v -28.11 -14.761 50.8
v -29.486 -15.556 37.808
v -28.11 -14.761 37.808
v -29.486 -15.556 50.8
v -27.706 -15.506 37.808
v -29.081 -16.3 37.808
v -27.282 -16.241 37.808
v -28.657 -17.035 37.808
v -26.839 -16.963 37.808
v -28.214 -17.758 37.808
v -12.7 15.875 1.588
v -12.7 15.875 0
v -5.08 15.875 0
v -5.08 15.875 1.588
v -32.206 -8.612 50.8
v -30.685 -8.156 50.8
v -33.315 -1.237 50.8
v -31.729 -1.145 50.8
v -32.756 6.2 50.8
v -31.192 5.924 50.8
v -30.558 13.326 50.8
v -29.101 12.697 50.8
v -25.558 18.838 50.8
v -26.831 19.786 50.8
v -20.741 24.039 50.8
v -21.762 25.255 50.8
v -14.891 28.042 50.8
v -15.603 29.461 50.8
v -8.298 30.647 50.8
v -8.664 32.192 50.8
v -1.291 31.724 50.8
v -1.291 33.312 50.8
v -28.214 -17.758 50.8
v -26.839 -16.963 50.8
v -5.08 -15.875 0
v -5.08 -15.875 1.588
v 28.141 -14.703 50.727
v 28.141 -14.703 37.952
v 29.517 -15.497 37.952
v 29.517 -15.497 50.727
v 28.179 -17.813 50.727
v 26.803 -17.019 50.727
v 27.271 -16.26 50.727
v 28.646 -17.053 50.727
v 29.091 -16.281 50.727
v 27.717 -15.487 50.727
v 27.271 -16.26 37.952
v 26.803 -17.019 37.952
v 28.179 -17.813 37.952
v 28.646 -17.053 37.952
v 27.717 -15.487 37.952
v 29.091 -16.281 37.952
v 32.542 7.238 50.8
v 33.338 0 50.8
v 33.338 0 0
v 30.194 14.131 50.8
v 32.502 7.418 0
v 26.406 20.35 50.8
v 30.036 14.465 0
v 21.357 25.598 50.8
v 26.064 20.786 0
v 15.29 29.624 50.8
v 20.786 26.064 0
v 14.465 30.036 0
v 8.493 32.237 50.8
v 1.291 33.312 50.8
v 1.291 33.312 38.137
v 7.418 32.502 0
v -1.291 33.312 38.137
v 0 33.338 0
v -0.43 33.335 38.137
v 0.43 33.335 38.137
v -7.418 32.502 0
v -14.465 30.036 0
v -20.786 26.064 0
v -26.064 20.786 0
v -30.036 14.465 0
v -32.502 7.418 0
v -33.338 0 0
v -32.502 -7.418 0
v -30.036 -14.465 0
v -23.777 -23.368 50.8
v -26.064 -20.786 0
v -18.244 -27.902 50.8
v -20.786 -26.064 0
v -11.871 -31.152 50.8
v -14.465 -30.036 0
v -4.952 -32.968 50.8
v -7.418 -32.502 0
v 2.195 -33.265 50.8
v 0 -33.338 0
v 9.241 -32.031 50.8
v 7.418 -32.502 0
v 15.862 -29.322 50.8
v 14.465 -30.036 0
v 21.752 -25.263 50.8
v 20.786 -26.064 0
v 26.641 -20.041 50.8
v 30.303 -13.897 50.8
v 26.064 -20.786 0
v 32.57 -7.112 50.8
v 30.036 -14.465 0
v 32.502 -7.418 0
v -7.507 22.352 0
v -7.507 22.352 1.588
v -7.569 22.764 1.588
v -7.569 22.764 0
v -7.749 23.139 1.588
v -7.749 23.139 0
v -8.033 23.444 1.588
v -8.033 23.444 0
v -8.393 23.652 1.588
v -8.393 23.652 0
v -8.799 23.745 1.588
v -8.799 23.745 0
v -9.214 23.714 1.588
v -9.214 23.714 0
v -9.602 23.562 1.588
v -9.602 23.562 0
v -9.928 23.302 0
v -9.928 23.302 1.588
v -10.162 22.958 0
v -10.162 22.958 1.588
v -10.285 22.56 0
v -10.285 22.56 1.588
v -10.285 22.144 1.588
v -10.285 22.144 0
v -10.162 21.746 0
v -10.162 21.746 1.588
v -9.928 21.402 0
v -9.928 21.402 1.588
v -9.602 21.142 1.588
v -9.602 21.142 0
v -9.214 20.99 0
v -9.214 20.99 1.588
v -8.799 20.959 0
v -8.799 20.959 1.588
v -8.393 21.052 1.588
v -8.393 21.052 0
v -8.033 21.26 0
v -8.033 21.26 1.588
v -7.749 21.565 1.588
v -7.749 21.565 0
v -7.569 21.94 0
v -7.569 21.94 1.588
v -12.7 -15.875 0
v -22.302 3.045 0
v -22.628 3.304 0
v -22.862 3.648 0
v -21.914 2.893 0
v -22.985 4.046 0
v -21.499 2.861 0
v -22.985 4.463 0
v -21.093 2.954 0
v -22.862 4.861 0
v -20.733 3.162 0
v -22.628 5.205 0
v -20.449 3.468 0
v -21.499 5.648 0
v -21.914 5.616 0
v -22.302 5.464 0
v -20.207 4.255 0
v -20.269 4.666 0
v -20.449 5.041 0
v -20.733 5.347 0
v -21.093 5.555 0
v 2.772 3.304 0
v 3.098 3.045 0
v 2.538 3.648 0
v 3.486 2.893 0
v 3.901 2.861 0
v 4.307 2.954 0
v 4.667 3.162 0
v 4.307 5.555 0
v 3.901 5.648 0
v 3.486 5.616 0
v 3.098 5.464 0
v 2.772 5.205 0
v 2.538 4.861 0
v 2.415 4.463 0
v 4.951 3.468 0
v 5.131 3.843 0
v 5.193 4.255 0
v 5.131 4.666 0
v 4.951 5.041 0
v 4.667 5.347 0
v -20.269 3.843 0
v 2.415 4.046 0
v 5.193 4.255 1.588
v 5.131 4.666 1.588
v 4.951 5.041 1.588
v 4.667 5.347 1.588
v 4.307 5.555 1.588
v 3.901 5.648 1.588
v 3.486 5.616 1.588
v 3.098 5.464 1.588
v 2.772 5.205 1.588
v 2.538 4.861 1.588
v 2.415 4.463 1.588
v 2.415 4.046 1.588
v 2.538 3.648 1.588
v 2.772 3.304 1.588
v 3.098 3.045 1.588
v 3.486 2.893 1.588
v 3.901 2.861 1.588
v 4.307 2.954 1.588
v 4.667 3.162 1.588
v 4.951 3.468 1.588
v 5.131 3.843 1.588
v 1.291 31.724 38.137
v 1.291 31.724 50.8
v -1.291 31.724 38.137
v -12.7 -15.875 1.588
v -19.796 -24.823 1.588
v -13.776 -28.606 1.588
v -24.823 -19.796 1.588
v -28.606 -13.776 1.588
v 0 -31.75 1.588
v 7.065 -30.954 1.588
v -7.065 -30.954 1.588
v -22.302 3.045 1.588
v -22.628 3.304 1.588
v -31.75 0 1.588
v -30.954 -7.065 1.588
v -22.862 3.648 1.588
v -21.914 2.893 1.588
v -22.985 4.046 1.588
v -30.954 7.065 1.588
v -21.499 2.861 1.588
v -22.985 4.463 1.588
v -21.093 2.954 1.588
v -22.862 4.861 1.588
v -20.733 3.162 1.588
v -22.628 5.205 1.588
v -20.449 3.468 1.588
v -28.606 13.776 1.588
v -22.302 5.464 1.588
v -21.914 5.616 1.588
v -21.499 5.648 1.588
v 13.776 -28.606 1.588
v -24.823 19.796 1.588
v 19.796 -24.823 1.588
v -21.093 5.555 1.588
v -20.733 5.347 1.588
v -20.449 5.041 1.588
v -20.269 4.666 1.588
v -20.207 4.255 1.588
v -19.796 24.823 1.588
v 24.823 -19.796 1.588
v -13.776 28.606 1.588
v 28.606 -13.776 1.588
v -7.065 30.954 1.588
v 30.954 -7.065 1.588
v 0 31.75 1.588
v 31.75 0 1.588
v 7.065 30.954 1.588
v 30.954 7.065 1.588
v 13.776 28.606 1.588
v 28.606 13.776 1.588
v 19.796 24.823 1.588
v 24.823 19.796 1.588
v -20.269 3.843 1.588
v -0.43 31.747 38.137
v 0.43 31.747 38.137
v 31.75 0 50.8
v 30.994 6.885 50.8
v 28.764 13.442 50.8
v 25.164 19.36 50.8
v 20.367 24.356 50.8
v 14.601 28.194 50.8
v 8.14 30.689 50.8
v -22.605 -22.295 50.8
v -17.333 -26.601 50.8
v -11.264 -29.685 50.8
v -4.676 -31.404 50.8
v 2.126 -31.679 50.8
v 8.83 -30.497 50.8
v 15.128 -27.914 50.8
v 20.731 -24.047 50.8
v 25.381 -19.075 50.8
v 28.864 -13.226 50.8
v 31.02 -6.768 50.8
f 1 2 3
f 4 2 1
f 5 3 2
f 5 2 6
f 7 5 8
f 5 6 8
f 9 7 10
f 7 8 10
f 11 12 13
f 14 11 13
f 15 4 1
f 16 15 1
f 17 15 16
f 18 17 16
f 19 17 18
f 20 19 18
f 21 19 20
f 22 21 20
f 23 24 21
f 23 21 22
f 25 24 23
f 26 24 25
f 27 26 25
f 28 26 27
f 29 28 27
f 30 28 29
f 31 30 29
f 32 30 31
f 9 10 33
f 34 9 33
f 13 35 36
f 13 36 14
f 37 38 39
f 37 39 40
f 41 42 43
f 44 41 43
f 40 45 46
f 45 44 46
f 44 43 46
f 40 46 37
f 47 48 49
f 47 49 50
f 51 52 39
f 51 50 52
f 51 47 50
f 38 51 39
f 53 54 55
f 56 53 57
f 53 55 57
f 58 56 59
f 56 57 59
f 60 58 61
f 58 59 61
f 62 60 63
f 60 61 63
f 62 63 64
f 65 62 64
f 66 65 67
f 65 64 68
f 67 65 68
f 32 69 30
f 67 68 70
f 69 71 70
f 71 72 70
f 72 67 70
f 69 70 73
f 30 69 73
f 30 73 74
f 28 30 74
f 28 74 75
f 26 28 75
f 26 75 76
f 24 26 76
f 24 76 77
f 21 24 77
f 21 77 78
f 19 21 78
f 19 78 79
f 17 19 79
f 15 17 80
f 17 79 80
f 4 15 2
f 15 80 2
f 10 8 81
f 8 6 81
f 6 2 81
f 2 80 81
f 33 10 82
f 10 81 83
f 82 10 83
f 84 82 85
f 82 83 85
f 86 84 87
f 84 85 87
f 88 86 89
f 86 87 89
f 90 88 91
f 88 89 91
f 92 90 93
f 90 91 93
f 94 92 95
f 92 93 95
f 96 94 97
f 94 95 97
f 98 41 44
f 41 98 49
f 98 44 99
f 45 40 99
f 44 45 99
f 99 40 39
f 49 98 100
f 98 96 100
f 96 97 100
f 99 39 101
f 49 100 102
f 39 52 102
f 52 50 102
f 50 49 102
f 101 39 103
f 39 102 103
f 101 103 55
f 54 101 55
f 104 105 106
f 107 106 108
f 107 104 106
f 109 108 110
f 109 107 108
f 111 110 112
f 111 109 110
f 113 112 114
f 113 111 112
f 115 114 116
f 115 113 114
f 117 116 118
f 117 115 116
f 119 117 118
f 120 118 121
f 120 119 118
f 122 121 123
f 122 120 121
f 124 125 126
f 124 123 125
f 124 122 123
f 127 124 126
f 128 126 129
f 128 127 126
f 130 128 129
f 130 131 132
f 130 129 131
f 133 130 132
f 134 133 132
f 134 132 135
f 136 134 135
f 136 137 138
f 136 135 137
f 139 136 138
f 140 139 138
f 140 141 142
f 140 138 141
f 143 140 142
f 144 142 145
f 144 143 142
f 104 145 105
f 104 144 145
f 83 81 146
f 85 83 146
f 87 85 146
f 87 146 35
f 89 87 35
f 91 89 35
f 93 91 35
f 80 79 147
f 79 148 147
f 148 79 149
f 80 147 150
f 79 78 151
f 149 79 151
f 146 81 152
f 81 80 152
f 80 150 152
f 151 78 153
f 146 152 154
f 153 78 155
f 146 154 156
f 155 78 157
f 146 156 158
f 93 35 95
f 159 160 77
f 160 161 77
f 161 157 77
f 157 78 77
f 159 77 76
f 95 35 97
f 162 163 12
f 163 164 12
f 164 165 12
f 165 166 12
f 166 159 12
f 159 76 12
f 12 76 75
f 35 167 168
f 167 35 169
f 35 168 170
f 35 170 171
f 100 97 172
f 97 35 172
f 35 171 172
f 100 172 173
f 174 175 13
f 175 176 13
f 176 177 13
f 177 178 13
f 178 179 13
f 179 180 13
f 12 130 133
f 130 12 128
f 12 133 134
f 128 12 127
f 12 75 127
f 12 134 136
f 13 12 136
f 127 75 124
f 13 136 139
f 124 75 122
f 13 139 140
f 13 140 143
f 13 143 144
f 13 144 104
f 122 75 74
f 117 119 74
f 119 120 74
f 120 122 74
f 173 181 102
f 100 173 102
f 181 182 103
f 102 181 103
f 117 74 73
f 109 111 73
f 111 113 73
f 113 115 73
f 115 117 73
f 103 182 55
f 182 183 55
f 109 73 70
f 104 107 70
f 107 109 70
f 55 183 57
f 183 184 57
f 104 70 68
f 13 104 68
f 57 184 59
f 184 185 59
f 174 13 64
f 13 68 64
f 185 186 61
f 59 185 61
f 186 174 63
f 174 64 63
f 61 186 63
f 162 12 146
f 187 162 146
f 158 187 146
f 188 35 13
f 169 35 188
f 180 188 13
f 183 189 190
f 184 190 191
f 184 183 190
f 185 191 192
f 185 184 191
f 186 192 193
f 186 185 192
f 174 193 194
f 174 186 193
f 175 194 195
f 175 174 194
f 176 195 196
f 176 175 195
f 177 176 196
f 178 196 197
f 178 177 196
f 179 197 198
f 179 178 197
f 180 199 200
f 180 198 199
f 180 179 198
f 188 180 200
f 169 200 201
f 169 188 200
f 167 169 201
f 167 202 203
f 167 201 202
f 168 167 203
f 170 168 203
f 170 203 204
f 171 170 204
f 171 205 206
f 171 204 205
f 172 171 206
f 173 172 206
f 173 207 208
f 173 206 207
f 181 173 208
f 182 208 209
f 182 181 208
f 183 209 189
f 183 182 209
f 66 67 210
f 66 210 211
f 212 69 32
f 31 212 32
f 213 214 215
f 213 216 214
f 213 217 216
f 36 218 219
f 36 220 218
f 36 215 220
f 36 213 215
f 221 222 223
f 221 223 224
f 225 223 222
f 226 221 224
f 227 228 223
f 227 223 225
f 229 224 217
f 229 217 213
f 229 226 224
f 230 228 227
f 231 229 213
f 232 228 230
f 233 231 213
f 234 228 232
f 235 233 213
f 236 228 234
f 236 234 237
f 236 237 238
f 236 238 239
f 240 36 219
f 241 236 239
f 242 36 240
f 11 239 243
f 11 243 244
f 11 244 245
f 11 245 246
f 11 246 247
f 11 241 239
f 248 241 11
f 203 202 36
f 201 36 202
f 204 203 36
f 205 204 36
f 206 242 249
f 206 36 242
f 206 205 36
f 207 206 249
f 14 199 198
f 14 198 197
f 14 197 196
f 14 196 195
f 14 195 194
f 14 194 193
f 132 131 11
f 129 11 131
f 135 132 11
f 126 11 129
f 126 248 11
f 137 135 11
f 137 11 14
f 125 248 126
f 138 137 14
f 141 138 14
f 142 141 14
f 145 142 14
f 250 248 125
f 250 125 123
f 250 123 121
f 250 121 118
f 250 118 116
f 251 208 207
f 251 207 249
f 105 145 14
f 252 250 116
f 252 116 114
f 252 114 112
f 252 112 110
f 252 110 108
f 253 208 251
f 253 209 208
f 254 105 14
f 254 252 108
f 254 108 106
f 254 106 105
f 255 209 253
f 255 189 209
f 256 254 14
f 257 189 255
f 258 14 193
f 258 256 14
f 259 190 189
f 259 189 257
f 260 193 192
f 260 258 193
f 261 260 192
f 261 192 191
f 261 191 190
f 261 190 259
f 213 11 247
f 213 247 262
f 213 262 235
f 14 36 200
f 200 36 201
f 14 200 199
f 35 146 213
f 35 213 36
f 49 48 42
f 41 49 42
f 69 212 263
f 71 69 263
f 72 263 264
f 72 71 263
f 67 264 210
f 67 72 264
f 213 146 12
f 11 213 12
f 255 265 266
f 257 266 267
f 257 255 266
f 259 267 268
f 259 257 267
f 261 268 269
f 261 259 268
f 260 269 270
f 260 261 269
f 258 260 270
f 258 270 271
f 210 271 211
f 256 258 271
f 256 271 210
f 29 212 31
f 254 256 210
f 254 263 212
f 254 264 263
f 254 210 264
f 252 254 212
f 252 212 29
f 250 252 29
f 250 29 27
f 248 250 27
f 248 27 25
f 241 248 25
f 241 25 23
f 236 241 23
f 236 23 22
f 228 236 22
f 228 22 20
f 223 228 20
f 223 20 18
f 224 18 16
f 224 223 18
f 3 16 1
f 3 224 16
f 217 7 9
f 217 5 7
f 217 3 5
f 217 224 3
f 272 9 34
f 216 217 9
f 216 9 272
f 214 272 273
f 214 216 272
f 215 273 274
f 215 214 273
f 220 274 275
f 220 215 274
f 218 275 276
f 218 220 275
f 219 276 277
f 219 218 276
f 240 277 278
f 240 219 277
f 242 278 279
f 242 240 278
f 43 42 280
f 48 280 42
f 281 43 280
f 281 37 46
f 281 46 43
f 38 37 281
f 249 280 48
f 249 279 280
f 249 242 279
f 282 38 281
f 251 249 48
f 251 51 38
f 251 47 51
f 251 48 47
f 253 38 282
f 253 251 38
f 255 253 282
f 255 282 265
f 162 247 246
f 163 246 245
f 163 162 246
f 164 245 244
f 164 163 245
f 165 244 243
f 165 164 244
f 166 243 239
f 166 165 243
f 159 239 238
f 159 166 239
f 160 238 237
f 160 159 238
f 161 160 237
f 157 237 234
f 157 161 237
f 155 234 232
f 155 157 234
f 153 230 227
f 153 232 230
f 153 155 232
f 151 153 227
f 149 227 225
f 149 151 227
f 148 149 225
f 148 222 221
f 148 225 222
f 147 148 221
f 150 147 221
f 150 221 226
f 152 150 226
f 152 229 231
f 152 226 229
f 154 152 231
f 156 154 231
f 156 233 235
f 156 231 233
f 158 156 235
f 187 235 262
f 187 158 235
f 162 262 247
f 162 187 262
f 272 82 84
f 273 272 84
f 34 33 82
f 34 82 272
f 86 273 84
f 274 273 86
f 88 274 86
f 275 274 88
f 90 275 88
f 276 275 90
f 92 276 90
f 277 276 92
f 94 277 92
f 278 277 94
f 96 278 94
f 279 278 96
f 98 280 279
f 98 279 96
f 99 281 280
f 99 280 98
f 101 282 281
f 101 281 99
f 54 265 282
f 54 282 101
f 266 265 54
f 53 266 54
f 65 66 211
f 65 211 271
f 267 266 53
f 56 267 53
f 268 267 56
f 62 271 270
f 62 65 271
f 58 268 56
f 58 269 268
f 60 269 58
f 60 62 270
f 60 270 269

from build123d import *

# Parameters (mm, degrees)
F0_R           = 33.3375
F1_DEPTH       = 50.8
F2_T           = -1.5875
F6_W           = 2.5429241359
F6_H           = 13.1887868047
F7_DEPTH       = 12.7
F10_W          = 2.6744855568
F10_H          = 12.775093317
F11_DEPTH      = 2.794
F11_DEPTH_BACK = 2.413
F13_W          = 2.5820170995
F13_H          = 12.7615630627
F14_DEPTH      = 5.0546
F14_DEPTH_BACK = 4.7244
F15_W          = 7.62
F15_H          = 31.75
F15_R          = 1.397
F16_DEPTH      = 9.906


# Not quite as in the source:
# - a feature names something its author has since deleted; it is built from what else it names


with BuildPart() as f1:
    # F0 (on Top) → F1 (new body)
    with BuildSketch(Plane.XY):
        Circle(F0_R)
    extrude(amount=F1_DEPTH)

    # F2
    f2_openings = [f1.faces().sort_by_distance(p)[0] for p in [
        (0, 0, 50.8),
    ]]
    offset(amount=F2_T, openings=f2_openings)

    # F6 (on offset) → F7 (cut)
    with BuildSketch(Plane(origin=(-28.8711218987, -16.66875, 0), x_dir=(0.5, -0.8660254038, 0), z_dir=(-0.8660254038, -0.5, 0))):
        with Locations((0, 44.4019660354)):
            Rectangle(F6_W, F6_H)
    extrude(amount=-F7_DEPTH, mode=Mode.SUBTRACT)

    # F10 (on offset) → F11 (cut, two sides)
    with BuildSketch(Plane(origin=(28.8161292855, -16.637, 0), x_dir=(0.5, 0.8660254038, 0), z_dir=(0.8660254038, -0.5, 0))) as f11_sk:
        with Locations((0, 44.3391613662)):
            Rectangle(F10_W, F10_H)
    extrude(amount=-F11_DEPTH, mode=Mode.SUBTRACT)
    extrude(f11_sk.sketch, amount=F11_DEPTH_BACK, mode=Mode.SUBTRACT)

    # F13 (on offset) → F14 (cut, two sides)
    with BuildSketch(Plane.XZ.offset(-33.81375)) as f14_sk:
        with Locations((0, 44.5175170898)):
            Rectangle(F13_W, F13_H)
    extrude(amount=-F14_DEPTH, mode=Mode.SUBTRACT)
    extrude(f14_sk.sketch, amount=F14_DEPTH_BACK, mode=Mode.SUBTRACT)

    # F15 (on Top) → F16 (cut)
    with BuildSketch(Plane.XY):
        with Locations((-8.89, 0)):
            Rectangle(F15_W, F15_H)
        with Locations((-21.6036192909, 4.2545016563)):
            Circle(F15_R)
        with Locations((3.7963807091, 4.2545016563)):
            Circle(F15_R)
        with Locations((-8.9036192909, 22.3520016563)):
            Circle(F15_R)
    extrude(amount=F16_DEPTH, mode=Mode.SUBTRACT)


solid = f1.part
